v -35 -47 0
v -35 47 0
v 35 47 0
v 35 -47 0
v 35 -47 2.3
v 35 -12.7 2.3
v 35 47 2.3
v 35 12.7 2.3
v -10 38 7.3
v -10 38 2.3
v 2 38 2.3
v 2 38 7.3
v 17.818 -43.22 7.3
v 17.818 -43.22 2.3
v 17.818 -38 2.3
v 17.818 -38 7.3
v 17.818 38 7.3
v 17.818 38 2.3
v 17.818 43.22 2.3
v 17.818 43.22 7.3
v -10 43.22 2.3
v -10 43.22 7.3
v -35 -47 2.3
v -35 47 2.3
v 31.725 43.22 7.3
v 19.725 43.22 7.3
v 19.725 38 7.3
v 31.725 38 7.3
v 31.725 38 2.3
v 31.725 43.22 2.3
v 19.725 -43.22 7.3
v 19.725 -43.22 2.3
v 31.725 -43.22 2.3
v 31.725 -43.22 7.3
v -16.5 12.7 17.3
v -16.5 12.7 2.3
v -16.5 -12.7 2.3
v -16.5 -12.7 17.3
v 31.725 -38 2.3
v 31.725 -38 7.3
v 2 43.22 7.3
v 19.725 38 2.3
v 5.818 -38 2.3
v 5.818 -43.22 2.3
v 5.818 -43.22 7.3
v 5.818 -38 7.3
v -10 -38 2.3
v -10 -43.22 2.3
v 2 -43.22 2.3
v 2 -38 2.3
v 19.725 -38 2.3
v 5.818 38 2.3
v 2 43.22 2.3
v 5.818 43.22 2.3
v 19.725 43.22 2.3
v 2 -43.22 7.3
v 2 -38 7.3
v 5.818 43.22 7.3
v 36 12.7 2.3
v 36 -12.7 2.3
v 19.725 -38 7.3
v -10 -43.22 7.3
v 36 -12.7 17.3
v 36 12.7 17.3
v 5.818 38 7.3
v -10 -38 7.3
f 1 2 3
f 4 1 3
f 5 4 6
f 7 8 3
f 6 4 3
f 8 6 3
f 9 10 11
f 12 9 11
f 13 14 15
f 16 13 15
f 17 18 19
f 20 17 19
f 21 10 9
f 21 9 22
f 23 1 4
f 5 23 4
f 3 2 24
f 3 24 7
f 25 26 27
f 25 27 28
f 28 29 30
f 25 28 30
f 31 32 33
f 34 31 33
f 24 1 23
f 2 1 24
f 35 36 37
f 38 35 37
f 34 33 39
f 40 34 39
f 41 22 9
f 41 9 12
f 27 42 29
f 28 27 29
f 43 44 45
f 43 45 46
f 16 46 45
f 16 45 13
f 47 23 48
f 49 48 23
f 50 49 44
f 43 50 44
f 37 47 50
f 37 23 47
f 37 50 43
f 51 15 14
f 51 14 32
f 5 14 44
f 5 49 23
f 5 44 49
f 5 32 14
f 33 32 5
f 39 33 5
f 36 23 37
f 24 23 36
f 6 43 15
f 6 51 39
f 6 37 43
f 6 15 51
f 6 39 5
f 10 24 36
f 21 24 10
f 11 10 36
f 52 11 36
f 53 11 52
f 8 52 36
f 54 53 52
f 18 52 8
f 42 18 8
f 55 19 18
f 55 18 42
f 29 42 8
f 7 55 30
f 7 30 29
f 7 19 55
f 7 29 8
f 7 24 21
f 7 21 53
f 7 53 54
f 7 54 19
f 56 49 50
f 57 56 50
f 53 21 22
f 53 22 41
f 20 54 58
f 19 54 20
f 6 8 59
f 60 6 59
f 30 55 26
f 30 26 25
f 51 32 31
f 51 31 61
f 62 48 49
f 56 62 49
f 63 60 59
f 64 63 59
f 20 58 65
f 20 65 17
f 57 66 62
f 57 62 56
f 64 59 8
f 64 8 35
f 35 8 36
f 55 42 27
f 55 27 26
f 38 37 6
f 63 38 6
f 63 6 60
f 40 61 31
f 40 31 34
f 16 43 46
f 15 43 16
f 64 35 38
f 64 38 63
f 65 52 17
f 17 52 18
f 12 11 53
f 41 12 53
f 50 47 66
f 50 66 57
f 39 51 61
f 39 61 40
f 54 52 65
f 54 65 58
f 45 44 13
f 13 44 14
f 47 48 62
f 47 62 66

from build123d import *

# Parameters (mm, degrees)
SKETCH2_W           = 70
SKETCH2_H           = 94
BOSS_EXTRUDE1_DEPTH = 2.3
SKETCH3_W           = 51.5
SKETCH3_H           = 12.7
BOSS_EXTRUDE2_DEPTH = 15
SKETCH4_W           = 12
SKETCH4_H           = 5.220497566
BOSS_EXTRUDE3_DEPTH = 5


with BuildPart() as part:
    # Sketch2 → Boss-Extrude1 (new body)
    with BuildSketch(Plane.XY):
        Rectangle(SKETCH2_W, SKETCH2_H)
    extrude(amount=BOSS_EXTRUDE1_DEPTH)

    # Sketch3 → Boss-Extrude2 (add)
    with BuildSketch(Plane.XY.offset(2.3)):
        with Locations((9.25, 6.35)):
            Rectangle(SKETCH3_W, SKETCH3_H)
        with Locations((9.25, -6.35)):
            Rectangle(SKETCH3_W, SKETCH3_H)
        Polygon((35, 12.7), (35, 0), (35, -12.7), (36, -12.7), (36, 12.7), align=None)
    extrude(amount=BOSS_EXTRUDE2_DEPTH)

    # Sketch4 → Boss-Extrude3 (add)
    with BuildSketch(Plane.XY.offset(2.3)):
        with Locations((-4, 40.610248783)):
            Rectangle(SKETCH4_W, SKETCH4_H)
        with Locations((11.818181083, 40.610248783)):
            Rectangle(SKETCH4_W, SKETCH4_H)
        with Locations((25.725310397, 40.610248783)):
            Rectangle(SKETCH4_W, SKETCH4_H)
        with Locations((-4, -40.610248783)):
            Rectangle(SKETCH4_W, SKETCH4_H)
        with Locations((11.818181083, -40.610248783)):
            Rectangle(SKETCH4_W, SKETCH4_H)
        with Locations((25.725310397, -40.610248783)):
            Rectangle(SKETCH4_W, SKETCH4_H)
    extrude(amount=BOSS_EXTRUDE3_DEPTH)


solid = part.part
